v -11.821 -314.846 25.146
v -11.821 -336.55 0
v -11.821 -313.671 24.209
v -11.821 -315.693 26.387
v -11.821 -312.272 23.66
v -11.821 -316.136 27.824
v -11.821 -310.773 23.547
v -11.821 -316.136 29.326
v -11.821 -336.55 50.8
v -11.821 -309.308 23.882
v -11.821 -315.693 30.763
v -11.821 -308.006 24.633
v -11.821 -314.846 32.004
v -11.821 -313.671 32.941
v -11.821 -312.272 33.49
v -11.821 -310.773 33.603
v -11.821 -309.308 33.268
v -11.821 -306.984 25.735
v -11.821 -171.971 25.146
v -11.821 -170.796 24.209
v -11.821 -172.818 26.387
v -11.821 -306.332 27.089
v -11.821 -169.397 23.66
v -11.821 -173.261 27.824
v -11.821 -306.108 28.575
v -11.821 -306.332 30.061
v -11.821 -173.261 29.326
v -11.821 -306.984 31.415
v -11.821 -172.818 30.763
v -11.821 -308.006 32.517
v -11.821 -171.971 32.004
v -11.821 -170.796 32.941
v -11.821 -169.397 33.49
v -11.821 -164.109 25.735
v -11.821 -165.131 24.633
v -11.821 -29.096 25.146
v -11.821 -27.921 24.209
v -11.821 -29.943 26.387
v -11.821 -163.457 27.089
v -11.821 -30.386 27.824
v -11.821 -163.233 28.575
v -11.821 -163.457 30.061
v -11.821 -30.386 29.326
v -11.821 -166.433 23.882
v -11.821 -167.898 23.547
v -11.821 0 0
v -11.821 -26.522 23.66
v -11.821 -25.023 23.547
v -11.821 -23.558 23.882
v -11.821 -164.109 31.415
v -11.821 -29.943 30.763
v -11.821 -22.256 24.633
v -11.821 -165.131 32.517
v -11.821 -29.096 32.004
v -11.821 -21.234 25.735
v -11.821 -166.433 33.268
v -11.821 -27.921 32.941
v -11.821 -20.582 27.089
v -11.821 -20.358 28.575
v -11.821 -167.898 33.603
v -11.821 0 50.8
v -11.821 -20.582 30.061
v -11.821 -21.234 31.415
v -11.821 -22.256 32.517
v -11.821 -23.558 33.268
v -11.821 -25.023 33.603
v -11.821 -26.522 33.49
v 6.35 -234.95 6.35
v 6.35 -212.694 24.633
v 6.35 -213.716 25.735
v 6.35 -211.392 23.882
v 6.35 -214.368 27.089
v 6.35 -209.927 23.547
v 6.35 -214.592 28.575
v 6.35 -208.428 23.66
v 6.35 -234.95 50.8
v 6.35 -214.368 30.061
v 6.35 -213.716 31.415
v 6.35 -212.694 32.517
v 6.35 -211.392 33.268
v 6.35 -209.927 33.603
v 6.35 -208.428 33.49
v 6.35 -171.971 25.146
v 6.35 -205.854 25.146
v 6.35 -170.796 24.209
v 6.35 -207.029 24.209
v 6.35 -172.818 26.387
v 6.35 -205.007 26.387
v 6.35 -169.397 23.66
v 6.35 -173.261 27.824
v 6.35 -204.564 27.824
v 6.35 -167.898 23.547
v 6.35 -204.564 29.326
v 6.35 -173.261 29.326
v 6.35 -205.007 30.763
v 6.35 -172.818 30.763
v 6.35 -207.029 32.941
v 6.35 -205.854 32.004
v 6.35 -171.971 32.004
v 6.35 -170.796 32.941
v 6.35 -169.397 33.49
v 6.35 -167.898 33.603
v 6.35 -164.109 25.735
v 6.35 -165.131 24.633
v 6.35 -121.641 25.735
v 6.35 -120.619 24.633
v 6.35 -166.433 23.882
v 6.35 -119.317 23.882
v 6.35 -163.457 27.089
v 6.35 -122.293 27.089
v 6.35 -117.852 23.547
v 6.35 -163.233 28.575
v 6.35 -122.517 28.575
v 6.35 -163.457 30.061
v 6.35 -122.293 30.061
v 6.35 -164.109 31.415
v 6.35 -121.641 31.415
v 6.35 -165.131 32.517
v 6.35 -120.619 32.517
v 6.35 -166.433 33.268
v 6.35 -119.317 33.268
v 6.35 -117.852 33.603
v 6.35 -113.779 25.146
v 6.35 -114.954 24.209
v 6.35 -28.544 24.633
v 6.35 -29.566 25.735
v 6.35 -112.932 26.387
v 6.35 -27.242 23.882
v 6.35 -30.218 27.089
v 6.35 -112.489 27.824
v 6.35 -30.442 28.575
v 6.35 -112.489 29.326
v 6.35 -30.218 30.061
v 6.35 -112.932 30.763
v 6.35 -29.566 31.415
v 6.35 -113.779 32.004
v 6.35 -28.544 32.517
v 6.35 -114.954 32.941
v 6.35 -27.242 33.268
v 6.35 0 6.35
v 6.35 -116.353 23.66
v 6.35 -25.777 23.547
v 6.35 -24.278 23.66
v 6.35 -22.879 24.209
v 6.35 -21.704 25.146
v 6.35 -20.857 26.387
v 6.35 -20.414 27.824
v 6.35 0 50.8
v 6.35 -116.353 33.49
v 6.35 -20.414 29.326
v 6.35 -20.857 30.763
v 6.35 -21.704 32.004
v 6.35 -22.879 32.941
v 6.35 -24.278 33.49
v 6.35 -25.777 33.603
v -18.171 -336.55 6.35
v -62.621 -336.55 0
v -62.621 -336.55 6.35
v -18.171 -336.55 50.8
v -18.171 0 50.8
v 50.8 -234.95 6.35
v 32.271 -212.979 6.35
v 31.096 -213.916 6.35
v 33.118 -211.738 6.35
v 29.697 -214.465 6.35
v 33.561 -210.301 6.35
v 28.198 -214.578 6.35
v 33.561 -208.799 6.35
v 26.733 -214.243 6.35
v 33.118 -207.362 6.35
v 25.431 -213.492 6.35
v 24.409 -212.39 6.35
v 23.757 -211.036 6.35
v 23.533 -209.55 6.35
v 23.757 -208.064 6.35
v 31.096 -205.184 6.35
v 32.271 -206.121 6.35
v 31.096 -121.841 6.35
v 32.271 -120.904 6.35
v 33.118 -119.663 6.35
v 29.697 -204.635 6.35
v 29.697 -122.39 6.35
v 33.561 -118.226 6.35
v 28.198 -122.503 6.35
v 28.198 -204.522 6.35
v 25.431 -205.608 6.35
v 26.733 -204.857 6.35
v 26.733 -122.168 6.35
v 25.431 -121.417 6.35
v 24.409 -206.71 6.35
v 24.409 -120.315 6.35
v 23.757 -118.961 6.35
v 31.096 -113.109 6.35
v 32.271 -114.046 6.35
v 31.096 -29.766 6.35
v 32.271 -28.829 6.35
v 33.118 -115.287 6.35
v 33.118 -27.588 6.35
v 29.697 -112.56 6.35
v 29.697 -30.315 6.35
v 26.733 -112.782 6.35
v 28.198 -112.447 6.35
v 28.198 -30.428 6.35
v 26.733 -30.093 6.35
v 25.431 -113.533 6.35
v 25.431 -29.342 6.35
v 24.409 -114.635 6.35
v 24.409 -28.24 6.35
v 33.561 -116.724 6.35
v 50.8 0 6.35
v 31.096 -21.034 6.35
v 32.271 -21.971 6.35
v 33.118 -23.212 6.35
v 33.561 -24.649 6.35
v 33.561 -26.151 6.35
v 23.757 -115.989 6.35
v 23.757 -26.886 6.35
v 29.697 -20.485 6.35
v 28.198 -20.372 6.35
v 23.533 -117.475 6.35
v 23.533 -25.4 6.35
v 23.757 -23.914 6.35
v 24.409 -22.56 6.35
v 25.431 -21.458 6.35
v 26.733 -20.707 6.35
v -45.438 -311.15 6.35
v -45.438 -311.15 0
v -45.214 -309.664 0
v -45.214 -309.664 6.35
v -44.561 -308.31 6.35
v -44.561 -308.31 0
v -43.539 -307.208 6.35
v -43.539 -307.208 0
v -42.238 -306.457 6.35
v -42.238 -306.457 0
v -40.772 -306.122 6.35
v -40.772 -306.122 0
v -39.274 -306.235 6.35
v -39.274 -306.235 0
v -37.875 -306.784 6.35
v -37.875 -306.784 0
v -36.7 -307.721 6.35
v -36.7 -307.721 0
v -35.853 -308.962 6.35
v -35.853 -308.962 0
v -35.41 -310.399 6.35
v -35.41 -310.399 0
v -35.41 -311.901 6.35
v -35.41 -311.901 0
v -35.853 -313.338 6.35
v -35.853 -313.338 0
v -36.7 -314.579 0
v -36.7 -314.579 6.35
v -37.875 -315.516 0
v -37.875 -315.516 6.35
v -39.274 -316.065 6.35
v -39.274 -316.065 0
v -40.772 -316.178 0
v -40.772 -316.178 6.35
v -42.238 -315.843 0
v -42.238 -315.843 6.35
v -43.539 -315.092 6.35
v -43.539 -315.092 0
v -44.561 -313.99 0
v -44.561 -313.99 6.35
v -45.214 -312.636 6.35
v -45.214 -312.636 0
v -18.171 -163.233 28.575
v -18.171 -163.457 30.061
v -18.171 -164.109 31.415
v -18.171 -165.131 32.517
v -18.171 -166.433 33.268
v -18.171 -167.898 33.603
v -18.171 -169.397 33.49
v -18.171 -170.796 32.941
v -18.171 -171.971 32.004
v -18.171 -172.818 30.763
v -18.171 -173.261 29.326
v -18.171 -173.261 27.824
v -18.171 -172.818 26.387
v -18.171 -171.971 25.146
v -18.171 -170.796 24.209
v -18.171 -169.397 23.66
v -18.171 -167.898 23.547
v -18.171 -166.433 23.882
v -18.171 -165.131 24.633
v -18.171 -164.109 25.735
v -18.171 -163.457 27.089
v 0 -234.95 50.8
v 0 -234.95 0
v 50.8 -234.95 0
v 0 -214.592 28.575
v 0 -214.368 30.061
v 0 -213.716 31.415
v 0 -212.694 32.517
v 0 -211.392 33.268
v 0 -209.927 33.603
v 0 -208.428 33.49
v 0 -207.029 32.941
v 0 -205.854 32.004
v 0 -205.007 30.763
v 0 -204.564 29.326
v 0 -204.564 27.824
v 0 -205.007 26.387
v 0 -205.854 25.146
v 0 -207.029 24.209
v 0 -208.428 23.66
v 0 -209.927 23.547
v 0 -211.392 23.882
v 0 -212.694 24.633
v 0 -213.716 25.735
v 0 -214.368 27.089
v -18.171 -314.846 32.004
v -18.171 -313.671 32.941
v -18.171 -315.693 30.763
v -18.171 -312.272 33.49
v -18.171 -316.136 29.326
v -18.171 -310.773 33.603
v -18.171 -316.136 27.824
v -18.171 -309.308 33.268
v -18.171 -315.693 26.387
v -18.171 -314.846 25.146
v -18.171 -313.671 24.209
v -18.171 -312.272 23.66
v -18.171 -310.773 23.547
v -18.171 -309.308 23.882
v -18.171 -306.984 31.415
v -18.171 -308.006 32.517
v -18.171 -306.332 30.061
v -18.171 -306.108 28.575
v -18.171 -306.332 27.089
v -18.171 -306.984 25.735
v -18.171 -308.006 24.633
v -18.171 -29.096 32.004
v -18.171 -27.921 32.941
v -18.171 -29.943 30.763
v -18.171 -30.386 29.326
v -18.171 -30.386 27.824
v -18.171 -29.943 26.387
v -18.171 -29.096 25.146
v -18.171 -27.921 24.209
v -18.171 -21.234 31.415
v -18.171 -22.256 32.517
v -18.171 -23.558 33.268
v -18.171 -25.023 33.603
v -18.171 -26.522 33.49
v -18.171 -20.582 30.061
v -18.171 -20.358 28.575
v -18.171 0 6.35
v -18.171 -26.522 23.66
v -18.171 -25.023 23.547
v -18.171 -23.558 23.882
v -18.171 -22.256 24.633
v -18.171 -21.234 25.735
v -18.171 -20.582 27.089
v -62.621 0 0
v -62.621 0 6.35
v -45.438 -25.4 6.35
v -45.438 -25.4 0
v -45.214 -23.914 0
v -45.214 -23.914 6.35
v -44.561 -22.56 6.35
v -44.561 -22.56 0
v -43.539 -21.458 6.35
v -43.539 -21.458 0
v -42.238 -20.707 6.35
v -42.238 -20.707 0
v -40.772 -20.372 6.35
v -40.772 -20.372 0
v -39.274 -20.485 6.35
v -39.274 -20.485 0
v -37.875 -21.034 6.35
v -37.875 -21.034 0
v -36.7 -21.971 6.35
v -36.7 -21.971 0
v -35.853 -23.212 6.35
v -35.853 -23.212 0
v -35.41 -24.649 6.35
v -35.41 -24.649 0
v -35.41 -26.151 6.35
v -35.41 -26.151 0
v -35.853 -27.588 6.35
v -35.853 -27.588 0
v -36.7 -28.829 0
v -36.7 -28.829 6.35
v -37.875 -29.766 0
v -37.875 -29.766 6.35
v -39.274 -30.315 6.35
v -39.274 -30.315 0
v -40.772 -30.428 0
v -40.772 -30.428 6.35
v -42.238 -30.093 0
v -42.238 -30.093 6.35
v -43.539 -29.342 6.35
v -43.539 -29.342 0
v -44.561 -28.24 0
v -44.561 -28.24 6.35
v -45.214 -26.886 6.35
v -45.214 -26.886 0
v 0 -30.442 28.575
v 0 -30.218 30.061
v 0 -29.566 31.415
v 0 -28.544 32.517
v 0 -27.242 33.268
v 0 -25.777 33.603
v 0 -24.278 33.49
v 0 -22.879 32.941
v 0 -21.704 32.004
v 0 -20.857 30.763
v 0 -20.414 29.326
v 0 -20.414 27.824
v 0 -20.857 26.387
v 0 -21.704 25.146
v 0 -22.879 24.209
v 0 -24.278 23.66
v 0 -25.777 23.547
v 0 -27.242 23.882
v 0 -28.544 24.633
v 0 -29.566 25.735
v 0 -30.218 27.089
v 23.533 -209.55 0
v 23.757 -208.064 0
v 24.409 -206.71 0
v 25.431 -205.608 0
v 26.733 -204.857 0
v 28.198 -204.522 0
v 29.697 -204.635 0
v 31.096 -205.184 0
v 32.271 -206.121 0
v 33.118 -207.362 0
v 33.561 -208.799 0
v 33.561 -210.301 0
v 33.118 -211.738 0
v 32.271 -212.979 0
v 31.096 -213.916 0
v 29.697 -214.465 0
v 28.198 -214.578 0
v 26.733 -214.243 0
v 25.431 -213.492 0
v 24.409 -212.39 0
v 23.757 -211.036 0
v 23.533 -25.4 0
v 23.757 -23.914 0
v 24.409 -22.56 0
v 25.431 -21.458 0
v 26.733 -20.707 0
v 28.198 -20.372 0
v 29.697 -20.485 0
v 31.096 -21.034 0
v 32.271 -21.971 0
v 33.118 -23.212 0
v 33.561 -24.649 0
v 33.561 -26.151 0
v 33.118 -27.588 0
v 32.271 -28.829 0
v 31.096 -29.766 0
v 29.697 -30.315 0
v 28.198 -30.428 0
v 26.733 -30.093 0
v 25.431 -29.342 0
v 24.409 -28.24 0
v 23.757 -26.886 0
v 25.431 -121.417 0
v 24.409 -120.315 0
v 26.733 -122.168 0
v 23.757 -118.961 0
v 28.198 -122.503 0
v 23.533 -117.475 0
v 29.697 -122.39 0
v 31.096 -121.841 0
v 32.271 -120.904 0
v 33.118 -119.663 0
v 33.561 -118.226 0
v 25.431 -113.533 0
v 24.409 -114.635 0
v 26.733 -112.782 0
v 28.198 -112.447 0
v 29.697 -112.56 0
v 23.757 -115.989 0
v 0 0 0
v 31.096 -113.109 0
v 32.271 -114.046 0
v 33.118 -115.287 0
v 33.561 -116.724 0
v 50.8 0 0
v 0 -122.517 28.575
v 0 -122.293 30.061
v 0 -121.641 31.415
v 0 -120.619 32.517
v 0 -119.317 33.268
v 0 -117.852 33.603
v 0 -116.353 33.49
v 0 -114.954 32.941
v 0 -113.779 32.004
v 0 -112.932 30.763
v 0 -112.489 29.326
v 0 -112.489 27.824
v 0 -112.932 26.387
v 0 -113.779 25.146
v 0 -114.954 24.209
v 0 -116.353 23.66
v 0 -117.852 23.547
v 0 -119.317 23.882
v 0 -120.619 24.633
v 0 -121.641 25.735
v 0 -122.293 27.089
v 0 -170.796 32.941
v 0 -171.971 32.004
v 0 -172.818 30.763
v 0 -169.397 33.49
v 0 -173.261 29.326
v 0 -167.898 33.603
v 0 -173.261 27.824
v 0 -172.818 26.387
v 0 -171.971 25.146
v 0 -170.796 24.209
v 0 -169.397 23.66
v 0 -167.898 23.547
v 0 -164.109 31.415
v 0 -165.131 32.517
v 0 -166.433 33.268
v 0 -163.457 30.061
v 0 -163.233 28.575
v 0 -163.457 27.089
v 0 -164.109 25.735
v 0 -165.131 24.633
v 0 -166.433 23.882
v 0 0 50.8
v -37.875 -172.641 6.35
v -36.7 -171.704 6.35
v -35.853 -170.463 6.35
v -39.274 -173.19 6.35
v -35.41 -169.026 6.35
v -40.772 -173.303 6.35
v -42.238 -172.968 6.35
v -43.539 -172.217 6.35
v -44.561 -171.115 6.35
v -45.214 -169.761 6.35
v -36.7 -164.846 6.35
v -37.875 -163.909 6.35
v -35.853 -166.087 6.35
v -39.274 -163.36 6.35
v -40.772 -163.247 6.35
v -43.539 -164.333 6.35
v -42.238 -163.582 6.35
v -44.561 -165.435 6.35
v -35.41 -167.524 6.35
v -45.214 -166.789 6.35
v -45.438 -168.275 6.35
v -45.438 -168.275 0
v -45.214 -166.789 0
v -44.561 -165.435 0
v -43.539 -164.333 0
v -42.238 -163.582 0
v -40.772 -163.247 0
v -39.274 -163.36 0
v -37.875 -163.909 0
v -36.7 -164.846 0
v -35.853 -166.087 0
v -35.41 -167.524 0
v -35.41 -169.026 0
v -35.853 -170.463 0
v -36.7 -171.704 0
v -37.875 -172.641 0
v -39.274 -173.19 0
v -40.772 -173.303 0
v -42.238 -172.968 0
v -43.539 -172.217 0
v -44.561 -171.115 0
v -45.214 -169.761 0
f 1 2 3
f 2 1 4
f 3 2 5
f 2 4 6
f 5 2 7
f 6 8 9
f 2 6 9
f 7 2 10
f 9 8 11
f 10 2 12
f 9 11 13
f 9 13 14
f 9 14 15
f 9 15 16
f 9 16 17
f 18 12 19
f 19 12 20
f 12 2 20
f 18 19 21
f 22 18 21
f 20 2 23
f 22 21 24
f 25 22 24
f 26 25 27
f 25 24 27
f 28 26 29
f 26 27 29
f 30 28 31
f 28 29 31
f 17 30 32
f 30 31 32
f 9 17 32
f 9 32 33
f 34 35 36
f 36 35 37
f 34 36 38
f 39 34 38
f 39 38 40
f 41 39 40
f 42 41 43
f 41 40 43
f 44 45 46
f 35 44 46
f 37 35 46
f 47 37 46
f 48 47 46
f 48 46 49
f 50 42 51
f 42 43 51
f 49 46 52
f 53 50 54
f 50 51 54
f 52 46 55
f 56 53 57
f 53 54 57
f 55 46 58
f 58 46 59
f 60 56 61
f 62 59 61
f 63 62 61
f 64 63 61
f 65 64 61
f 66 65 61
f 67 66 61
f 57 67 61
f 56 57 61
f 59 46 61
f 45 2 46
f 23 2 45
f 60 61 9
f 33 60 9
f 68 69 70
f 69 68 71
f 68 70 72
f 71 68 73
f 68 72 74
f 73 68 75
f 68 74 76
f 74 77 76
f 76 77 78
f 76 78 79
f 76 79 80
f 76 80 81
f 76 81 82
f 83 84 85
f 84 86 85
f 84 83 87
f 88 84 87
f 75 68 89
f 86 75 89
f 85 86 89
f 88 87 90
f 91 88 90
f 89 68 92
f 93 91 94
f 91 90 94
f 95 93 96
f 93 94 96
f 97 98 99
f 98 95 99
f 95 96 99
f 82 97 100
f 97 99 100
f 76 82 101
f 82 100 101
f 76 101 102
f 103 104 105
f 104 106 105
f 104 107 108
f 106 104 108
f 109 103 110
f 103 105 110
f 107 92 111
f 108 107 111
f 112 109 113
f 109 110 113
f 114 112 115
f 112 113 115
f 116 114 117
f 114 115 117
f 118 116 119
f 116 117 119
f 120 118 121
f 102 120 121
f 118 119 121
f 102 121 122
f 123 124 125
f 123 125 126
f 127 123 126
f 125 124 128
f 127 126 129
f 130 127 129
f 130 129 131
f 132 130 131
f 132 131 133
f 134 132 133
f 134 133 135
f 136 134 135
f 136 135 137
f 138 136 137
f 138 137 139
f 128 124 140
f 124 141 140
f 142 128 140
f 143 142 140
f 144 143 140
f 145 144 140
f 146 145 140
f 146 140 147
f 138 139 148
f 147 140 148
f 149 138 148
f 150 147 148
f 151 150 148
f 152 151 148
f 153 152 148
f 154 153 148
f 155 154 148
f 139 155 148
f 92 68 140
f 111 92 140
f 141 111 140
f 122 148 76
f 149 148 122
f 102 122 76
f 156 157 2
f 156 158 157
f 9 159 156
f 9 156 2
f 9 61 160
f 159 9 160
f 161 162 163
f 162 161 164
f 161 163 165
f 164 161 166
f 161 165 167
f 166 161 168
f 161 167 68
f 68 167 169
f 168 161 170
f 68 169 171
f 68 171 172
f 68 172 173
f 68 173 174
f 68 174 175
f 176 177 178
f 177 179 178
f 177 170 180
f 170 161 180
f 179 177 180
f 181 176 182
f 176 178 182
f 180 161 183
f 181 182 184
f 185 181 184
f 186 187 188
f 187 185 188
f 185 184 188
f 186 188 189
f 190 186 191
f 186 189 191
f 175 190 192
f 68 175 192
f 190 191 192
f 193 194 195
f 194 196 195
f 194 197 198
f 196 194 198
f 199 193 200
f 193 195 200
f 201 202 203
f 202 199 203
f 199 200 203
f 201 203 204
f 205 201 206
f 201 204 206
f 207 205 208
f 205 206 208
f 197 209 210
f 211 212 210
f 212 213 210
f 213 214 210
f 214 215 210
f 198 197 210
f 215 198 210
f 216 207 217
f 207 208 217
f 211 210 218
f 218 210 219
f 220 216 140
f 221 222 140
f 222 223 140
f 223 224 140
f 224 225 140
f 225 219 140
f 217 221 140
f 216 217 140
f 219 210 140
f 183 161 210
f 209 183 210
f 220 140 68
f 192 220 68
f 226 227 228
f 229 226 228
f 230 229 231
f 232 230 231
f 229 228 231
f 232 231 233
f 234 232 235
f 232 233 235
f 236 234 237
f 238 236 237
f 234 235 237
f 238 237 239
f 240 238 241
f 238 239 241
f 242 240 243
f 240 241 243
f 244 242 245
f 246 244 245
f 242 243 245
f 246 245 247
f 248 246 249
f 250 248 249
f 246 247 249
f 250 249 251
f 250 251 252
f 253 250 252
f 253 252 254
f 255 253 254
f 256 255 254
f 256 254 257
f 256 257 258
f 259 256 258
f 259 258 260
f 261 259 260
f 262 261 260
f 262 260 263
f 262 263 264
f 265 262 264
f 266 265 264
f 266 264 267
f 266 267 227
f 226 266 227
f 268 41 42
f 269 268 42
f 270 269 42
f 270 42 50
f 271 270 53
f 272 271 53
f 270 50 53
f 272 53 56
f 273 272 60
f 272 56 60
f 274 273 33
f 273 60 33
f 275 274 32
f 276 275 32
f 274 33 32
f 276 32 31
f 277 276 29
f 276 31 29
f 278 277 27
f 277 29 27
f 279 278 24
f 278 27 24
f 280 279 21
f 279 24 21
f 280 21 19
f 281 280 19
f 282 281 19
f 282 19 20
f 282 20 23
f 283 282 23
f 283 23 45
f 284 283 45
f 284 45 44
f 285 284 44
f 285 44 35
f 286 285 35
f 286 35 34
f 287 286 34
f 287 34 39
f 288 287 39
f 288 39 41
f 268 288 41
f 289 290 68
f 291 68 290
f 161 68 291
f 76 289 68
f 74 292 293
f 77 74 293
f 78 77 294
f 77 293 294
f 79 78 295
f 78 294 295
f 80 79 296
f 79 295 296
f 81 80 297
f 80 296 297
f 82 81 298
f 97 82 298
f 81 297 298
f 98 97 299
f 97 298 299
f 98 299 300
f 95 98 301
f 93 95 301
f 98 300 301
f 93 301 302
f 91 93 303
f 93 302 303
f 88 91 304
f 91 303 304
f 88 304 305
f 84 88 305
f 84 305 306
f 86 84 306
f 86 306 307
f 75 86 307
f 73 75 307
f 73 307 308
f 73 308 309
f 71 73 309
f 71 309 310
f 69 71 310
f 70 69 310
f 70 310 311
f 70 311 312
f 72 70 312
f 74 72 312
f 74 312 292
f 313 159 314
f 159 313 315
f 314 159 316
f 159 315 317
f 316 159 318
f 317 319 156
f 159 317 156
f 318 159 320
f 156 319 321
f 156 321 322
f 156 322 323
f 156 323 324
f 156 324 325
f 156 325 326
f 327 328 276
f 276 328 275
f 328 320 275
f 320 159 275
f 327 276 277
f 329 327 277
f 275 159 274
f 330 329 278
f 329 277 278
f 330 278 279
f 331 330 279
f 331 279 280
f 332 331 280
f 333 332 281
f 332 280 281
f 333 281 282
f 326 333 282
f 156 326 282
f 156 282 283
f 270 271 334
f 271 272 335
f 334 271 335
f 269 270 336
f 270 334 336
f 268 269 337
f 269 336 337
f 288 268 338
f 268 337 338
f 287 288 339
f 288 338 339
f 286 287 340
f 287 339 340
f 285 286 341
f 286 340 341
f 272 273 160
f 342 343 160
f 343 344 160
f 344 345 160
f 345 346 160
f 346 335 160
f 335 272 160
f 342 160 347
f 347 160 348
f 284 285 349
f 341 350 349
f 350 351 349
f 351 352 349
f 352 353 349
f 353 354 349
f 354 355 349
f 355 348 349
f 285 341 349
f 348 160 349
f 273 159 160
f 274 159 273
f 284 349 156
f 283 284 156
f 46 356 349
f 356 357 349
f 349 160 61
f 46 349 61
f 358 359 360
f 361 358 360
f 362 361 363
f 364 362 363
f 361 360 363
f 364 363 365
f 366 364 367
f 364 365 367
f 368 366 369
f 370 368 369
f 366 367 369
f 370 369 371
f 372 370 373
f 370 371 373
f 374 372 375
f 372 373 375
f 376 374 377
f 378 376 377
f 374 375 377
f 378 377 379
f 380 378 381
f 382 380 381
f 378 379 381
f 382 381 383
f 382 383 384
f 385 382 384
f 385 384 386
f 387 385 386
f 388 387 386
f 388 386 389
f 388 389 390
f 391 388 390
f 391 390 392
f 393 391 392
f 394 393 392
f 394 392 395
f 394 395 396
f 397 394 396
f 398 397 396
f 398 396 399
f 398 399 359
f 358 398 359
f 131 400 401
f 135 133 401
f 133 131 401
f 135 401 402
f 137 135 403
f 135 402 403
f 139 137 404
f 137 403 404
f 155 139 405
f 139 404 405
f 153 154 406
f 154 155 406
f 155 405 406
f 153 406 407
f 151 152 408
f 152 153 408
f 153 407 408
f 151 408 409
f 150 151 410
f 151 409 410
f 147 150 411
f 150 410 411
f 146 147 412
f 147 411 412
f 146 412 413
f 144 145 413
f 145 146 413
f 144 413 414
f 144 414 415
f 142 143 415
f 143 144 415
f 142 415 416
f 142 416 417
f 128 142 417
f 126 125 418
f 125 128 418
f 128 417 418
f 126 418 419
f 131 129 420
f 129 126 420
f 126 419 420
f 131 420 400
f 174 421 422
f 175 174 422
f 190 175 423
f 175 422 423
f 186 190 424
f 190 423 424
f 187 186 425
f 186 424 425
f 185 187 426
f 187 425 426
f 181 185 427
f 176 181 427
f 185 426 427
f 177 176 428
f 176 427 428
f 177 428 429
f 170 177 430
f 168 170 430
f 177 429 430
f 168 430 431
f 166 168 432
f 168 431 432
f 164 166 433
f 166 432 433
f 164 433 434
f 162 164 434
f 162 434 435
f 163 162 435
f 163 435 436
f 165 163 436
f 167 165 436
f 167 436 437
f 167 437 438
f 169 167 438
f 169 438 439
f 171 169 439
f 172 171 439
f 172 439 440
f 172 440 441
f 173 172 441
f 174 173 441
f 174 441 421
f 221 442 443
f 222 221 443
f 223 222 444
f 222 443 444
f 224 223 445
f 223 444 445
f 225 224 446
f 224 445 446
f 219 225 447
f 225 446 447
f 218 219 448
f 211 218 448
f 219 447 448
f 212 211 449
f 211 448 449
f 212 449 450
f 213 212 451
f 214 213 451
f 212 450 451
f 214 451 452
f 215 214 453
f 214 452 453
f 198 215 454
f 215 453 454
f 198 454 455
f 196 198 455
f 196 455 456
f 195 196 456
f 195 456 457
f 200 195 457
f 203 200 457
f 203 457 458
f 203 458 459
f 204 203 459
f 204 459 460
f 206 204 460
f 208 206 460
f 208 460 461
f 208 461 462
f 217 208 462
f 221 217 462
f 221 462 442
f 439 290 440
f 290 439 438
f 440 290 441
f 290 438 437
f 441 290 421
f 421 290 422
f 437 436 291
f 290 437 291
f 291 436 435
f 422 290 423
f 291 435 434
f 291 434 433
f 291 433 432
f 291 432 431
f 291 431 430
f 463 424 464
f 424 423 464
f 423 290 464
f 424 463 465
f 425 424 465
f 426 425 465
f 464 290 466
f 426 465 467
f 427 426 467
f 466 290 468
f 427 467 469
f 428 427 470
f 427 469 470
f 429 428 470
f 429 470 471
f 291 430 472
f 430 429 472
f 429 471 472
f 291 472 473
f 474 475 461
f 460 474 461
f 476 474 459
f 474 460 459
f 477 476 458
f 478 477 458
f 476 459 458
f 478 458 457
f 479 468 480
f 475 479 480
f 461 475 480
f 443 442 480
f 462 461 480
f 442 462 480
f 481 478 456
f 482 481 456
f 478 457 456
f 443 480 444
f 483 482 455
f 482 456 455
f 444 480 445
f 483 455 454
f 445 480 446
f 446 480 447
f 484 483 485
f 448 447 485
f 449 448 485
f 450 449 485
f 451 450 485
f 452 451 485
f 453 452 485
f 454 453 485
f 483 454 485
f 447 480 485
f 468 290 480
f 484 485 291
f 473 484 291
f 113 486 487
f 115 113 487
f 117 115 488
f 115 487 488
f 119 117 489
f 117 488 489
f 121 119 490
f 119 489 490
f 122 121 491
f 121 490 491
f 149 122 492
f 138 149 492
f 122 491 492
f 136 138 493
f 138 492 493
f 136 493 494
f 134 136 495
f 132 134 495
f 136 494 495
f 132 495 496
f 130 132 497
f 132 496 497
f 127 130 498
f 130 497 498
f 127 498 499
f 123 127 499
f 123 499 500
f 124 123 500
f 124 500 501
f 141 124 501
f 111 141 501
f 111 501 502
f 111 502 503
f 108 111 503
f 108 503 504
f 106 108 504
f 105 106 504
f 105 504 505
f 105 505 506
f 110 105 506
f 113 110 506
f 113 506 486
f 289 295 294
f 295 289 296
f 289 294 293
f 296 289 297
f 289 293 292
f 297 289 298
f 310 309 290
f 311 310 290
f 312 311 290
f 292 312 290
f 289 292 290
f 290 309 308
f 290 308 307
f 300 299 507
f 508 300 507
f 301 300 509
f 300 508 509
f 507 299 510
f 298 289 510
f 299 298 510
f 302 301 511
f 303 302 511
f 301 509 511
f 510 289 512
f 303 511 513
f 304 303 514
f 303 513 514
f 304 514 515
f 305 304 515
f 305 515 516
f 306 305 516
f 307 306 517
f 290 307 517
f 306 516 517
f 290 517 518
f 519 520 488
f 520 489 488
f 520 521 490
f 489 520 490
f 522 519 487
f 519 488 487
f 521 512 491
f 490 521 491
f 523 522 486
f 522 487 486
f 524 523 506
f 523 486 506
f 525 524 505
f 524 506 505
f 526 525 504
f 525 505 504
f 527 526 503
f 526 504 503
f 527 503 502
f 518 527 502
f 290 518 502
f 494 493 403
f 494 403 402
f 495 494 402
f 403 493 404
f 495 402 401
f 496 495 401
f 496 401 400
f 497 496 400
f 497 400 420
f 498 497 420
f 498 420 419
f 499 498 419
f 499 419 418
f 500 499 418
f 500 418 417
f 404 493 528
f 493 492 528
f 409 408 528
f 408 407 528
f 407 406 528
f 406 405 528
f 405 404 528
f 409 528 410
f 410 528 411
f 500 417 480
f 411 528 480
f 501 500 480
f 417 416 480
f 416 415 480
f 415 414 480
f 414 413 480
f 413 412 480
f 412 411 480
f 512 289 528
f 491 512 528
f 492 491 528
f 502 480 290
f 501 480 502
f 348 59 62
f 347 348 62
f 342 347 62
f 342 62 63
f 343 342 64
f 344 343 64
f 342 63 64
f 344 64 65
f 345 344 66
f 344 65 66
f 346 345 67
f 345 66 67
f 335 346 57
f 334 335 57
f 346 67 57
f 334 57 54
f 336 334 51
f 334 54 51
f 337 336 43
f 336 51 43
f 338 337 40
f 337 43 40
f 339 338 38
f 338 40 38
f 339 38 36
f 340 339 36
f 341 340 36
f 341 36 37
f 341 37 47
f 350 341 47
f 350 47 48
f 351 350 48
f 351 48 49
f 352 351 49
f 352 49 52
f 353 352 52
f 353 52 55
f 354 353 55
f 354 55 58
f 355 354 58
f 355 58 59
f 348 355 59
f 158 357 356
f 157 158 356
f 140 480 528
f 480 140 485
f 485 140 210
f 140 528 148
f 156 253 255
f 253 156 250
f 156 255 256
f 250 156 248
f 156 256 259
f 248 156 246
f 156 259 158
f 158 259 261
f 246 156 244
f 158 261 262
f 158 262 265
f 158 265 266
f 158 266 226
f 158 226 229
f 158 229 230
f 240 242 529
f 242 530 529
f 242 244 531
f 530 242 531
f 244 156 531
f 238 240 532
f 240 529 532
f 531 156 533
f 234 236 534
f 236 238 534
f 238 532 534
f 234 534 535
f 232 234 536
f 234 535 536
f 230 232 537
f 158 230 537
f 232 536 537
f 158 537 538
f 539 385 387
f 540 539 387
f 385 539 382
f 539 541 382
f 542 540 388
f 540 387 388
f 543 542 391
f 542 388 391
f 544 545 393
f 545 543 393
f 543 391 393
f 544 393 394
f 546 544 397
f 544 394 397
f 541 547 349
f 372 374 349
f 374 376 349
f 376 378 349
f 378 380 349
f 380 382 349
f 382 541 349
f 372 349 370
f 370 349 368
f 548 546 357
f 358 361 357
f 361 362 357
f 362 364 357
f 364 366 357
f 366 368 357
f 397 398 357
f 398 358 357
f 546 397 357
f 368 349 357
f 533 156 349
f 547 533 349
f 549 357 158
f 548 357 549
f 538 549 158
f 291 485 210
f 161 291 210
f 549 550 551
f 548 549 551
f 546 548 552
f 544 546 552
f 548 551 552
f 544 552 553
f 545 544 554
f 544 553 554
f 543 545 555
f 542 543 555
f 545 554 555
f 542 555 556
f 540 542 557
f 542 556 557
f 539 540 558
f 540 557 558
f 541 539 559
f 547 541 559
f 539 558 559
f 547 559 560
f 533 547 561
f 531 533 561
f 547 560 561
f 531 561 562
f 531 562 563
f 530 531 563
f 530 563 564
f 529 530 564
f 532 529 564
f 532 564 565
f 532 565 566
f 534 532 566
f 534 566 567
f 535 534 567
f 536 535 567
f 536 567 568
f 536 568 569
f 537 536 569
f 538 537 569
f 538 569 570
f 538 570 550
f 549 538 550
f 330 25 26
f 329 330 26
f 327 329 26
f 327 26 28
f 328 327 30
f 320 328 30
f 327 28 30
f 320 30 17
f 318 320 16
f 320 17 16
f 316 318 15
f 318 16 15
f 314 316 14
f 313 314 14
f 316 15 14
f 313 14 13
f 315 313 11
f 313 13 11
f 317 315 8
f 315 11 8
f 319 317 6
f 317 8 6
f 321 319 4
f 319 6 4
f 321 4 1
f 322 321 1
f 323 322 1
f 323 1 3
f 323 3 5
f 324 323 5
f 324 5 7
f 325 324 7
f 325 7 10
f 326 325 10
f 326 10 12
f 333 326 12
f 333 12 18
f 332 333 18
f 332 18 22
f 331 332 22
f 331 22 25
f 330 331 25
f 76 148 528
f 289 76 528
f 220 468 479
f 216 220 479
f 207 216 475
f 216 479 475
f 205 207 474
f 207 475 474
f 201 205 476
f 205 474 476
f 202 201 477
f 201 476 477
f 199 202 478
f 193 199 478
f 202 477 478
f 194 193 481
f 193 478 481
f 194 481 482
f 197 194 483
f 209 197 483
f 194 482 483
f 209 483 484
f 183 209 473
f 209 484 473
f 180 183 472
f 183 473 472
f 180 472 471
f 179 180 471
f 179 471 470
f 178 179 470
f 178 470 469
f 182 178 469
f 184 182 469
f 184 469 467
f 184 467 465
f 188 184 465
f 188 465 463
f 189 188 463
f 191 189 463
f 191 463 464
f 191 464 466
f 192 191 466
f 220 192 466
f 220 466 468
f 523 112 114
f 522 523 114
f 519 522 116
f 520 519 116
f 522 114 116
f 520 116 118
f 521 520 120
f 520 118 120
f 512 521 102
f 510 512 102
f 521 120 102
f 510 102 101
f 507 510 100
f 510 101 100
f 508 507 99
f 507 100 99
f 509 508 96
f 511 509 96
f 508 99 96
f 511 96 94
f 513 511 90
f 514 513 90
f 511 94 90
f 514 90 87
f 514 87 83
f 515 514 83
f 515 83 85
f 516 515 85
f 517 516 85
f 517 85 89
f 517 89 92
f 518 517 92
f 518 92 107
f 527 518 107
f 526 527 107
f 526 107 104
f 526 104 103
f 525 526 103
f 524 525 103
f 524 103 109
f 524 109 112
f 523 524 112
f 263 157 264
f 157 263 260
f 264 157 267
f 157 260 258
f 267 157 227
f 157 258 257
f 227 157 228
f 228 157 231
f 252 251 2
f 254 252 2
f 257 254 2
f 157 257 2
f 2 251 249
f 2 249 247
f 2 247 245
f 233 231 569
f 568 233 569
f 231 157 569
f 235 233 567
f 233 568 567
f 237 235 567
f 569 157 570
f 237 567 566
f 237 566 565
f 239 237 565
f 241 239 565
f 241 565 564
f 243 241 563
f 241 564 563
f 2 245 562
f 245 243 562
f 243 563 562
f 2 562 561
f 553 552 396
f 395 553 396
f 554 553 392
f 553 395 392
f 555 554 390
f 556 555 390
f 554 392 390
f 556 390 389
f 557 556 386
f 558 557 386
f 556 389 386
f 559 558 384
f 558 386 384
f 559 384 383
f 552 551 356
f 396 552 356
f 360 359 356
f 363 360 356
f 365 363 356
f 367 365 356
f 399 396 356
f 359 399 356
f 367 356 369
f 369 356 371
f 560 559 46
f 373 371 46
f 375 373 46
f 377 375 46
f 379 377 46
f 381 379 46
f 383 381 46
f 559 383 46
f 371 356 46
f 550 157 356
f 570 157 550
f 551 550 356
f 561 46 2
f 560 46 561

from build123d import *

# Parameters (mm, degrees)
F1_DEPTH   = 234.95
F4_D       = 10.0838
F4_ON_F2_D = 10.0838
F6_DEPTH   = 336.55
F9_D       = 10.0838
F9_2_D     = 10.0838
F9_ON_F7_D = 10.0838


with BuildPart() as f1:
    # F0 (on Front) → F1 (new body)
    with BuildSketch(Plane.XZ):
        Polygon((0, 50.8), (0, 0), (50.8, 0), (50.8, 6.35), (6.35, 6.35), (6.35, 50.8), align=None)
    extrude(amount=F1_DEPTH)

    # F4 (through all)
    with Locations(Plane.YZ.offset(6.35)):
        with Locations((-25.4, 28.575), (-117.475, 28.575), (-209.55, 28.575)):
            Hole(F4_D / 2)

    # F4 on F2 (through all)
    with Locations(Plane.XY.offset(6.35)):
        with Locations((28.575, -209.55), (28.575, -25.4), (28.575, -117.475)):
            Hole(F4_ON_F2_D / 2)

    # F9 (through all)
    with Locations(Plane(origin=(-18.1706255869, 0, 0), x_dir=(0, -1, 0), z_dir=(-1, 0, 0))):
        with Locations((25.4, 28.575), (168.275, 28.575), (311.15, 28.575)):
            Hole(F9_D / 2)


with BuildPart() as f6:
    # F5 (on Front) → F6 (new body)
    with BuildSketch(Plane.XZ):
        Polygon((-62.6206255869, 0), (-11.8206255869, 0), (-11.8206255869, 50.8), (-18.1706255869, 50.8), (-18.1706255869, 6.35), (-62.6206255869, 6.35), align=None)
    extrude(amount=F6_DEPTH)

    # F9#2 (through all)
    with Locations(Plane(origin=(-18.1706255869, 0, 0), x_dir=(0, -1, 0), z_dir=(-1, 0, 0))):
        with Locations((25.4, 28.575), (168.275, 28.575), (311.15, 28.575)):
            Hole(F9_2_D / 2)

    # F9 on F7 (through all)
    with Locations(Plane.XY.offset(6.35)):
        with Locations((-40.3956255869, -168.275), (-40.3956255869, -25.4), (-40.3956255869, -311.15)):
            Hole(F9_ON_F7_D / 2)


solid = Compound([f1.part, f6.part])
